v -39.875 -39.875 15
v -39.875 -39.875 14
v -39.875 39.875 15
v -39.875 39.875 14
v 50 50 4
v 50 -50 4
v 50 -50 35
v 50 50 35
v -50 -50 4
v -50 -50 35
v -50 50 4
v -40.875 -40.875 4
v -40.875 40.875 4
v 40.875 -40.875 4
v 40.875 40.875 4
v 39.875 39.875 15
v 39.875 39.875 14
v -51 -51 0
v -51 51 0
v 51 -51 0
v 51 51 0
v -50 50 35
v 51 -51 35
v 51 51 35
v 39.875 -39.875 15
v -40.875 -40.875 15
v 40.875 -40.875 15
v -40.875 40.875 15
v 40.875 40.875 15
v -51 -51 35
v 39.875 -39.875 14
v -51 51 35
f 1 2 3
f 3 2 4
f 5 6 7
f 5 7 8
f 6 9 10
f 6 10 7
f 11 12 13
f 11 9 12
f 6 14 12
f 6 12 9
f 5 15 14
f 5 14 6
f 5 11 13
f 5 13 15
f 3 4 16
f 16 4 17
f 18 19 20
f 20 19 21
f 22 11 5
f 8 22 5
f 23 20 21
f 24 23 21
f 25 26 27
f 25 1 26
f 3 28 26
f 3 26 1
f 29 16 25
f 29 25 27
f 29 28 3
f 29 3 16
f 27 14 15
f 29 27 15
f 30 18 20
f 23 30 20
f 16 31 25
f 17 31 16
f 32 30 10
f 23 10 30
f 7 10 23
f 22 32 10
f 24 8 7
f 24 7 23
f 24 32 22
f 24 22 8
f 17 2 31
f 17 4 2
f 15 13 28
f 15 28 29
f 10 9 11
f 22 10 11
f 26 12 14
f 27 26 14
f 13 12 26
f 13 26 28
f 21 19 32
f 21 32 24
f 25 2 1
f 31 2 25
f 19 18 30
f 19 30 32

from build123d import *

# Parameters (mm, degrees)
F0_W     = 102
F0_H     = 102
F1_DEPTH = 4
F2_W     = 102
F2_H     = 102
F2_W_2   = 100
F2_H_2   = 100
F3_DEPTH = 35
F4_W     = 81.75
F4_H     = 81.75
F4_W_2   = 79.75
F4_H_2   = 79.75
F5_DEPTH = 15
F7_DEPTH = 10


# Not quite as in the source:
# - a feature names something its author has since deleted; it is built from what else it names


with BuildPart() as f1:
    # F0 (on Top) → F1 (new body)
    with BuildSketch(Plane.XY):
        Rectangle(F0_W, F0_H)
    extrude(amount=F1_DEPTH)

    # F2 (on Top) → F3 (join)
    with BuildSketch(Plane.XY):
        Rectangle(F2_W, F2_H)
        Rectangle(F2_W_2, F2_H_2, mode=Mode.SUBTRACT)
    extrude(amount=F3_DEPTH)

    # F4 (on Top) → F5 (join)
    with BuildSketch(Plane.XY):
        Rectangle(F4_W, F4_H)
        Rectangle(F4_W_2, F4_H_2, mode=Mode.SUBTRACT)
    extrude(amount=F5_DEPTH)

    # F6: union 

    # F7 (add): a face of the model
    f7_faces = [f1.faces().sort_by_distance(p)[0] for p in [
        (0, 0, 4),
    ]]
    extrude(f7_faces, amount=F7_DEPTH)


solid = f1.part
